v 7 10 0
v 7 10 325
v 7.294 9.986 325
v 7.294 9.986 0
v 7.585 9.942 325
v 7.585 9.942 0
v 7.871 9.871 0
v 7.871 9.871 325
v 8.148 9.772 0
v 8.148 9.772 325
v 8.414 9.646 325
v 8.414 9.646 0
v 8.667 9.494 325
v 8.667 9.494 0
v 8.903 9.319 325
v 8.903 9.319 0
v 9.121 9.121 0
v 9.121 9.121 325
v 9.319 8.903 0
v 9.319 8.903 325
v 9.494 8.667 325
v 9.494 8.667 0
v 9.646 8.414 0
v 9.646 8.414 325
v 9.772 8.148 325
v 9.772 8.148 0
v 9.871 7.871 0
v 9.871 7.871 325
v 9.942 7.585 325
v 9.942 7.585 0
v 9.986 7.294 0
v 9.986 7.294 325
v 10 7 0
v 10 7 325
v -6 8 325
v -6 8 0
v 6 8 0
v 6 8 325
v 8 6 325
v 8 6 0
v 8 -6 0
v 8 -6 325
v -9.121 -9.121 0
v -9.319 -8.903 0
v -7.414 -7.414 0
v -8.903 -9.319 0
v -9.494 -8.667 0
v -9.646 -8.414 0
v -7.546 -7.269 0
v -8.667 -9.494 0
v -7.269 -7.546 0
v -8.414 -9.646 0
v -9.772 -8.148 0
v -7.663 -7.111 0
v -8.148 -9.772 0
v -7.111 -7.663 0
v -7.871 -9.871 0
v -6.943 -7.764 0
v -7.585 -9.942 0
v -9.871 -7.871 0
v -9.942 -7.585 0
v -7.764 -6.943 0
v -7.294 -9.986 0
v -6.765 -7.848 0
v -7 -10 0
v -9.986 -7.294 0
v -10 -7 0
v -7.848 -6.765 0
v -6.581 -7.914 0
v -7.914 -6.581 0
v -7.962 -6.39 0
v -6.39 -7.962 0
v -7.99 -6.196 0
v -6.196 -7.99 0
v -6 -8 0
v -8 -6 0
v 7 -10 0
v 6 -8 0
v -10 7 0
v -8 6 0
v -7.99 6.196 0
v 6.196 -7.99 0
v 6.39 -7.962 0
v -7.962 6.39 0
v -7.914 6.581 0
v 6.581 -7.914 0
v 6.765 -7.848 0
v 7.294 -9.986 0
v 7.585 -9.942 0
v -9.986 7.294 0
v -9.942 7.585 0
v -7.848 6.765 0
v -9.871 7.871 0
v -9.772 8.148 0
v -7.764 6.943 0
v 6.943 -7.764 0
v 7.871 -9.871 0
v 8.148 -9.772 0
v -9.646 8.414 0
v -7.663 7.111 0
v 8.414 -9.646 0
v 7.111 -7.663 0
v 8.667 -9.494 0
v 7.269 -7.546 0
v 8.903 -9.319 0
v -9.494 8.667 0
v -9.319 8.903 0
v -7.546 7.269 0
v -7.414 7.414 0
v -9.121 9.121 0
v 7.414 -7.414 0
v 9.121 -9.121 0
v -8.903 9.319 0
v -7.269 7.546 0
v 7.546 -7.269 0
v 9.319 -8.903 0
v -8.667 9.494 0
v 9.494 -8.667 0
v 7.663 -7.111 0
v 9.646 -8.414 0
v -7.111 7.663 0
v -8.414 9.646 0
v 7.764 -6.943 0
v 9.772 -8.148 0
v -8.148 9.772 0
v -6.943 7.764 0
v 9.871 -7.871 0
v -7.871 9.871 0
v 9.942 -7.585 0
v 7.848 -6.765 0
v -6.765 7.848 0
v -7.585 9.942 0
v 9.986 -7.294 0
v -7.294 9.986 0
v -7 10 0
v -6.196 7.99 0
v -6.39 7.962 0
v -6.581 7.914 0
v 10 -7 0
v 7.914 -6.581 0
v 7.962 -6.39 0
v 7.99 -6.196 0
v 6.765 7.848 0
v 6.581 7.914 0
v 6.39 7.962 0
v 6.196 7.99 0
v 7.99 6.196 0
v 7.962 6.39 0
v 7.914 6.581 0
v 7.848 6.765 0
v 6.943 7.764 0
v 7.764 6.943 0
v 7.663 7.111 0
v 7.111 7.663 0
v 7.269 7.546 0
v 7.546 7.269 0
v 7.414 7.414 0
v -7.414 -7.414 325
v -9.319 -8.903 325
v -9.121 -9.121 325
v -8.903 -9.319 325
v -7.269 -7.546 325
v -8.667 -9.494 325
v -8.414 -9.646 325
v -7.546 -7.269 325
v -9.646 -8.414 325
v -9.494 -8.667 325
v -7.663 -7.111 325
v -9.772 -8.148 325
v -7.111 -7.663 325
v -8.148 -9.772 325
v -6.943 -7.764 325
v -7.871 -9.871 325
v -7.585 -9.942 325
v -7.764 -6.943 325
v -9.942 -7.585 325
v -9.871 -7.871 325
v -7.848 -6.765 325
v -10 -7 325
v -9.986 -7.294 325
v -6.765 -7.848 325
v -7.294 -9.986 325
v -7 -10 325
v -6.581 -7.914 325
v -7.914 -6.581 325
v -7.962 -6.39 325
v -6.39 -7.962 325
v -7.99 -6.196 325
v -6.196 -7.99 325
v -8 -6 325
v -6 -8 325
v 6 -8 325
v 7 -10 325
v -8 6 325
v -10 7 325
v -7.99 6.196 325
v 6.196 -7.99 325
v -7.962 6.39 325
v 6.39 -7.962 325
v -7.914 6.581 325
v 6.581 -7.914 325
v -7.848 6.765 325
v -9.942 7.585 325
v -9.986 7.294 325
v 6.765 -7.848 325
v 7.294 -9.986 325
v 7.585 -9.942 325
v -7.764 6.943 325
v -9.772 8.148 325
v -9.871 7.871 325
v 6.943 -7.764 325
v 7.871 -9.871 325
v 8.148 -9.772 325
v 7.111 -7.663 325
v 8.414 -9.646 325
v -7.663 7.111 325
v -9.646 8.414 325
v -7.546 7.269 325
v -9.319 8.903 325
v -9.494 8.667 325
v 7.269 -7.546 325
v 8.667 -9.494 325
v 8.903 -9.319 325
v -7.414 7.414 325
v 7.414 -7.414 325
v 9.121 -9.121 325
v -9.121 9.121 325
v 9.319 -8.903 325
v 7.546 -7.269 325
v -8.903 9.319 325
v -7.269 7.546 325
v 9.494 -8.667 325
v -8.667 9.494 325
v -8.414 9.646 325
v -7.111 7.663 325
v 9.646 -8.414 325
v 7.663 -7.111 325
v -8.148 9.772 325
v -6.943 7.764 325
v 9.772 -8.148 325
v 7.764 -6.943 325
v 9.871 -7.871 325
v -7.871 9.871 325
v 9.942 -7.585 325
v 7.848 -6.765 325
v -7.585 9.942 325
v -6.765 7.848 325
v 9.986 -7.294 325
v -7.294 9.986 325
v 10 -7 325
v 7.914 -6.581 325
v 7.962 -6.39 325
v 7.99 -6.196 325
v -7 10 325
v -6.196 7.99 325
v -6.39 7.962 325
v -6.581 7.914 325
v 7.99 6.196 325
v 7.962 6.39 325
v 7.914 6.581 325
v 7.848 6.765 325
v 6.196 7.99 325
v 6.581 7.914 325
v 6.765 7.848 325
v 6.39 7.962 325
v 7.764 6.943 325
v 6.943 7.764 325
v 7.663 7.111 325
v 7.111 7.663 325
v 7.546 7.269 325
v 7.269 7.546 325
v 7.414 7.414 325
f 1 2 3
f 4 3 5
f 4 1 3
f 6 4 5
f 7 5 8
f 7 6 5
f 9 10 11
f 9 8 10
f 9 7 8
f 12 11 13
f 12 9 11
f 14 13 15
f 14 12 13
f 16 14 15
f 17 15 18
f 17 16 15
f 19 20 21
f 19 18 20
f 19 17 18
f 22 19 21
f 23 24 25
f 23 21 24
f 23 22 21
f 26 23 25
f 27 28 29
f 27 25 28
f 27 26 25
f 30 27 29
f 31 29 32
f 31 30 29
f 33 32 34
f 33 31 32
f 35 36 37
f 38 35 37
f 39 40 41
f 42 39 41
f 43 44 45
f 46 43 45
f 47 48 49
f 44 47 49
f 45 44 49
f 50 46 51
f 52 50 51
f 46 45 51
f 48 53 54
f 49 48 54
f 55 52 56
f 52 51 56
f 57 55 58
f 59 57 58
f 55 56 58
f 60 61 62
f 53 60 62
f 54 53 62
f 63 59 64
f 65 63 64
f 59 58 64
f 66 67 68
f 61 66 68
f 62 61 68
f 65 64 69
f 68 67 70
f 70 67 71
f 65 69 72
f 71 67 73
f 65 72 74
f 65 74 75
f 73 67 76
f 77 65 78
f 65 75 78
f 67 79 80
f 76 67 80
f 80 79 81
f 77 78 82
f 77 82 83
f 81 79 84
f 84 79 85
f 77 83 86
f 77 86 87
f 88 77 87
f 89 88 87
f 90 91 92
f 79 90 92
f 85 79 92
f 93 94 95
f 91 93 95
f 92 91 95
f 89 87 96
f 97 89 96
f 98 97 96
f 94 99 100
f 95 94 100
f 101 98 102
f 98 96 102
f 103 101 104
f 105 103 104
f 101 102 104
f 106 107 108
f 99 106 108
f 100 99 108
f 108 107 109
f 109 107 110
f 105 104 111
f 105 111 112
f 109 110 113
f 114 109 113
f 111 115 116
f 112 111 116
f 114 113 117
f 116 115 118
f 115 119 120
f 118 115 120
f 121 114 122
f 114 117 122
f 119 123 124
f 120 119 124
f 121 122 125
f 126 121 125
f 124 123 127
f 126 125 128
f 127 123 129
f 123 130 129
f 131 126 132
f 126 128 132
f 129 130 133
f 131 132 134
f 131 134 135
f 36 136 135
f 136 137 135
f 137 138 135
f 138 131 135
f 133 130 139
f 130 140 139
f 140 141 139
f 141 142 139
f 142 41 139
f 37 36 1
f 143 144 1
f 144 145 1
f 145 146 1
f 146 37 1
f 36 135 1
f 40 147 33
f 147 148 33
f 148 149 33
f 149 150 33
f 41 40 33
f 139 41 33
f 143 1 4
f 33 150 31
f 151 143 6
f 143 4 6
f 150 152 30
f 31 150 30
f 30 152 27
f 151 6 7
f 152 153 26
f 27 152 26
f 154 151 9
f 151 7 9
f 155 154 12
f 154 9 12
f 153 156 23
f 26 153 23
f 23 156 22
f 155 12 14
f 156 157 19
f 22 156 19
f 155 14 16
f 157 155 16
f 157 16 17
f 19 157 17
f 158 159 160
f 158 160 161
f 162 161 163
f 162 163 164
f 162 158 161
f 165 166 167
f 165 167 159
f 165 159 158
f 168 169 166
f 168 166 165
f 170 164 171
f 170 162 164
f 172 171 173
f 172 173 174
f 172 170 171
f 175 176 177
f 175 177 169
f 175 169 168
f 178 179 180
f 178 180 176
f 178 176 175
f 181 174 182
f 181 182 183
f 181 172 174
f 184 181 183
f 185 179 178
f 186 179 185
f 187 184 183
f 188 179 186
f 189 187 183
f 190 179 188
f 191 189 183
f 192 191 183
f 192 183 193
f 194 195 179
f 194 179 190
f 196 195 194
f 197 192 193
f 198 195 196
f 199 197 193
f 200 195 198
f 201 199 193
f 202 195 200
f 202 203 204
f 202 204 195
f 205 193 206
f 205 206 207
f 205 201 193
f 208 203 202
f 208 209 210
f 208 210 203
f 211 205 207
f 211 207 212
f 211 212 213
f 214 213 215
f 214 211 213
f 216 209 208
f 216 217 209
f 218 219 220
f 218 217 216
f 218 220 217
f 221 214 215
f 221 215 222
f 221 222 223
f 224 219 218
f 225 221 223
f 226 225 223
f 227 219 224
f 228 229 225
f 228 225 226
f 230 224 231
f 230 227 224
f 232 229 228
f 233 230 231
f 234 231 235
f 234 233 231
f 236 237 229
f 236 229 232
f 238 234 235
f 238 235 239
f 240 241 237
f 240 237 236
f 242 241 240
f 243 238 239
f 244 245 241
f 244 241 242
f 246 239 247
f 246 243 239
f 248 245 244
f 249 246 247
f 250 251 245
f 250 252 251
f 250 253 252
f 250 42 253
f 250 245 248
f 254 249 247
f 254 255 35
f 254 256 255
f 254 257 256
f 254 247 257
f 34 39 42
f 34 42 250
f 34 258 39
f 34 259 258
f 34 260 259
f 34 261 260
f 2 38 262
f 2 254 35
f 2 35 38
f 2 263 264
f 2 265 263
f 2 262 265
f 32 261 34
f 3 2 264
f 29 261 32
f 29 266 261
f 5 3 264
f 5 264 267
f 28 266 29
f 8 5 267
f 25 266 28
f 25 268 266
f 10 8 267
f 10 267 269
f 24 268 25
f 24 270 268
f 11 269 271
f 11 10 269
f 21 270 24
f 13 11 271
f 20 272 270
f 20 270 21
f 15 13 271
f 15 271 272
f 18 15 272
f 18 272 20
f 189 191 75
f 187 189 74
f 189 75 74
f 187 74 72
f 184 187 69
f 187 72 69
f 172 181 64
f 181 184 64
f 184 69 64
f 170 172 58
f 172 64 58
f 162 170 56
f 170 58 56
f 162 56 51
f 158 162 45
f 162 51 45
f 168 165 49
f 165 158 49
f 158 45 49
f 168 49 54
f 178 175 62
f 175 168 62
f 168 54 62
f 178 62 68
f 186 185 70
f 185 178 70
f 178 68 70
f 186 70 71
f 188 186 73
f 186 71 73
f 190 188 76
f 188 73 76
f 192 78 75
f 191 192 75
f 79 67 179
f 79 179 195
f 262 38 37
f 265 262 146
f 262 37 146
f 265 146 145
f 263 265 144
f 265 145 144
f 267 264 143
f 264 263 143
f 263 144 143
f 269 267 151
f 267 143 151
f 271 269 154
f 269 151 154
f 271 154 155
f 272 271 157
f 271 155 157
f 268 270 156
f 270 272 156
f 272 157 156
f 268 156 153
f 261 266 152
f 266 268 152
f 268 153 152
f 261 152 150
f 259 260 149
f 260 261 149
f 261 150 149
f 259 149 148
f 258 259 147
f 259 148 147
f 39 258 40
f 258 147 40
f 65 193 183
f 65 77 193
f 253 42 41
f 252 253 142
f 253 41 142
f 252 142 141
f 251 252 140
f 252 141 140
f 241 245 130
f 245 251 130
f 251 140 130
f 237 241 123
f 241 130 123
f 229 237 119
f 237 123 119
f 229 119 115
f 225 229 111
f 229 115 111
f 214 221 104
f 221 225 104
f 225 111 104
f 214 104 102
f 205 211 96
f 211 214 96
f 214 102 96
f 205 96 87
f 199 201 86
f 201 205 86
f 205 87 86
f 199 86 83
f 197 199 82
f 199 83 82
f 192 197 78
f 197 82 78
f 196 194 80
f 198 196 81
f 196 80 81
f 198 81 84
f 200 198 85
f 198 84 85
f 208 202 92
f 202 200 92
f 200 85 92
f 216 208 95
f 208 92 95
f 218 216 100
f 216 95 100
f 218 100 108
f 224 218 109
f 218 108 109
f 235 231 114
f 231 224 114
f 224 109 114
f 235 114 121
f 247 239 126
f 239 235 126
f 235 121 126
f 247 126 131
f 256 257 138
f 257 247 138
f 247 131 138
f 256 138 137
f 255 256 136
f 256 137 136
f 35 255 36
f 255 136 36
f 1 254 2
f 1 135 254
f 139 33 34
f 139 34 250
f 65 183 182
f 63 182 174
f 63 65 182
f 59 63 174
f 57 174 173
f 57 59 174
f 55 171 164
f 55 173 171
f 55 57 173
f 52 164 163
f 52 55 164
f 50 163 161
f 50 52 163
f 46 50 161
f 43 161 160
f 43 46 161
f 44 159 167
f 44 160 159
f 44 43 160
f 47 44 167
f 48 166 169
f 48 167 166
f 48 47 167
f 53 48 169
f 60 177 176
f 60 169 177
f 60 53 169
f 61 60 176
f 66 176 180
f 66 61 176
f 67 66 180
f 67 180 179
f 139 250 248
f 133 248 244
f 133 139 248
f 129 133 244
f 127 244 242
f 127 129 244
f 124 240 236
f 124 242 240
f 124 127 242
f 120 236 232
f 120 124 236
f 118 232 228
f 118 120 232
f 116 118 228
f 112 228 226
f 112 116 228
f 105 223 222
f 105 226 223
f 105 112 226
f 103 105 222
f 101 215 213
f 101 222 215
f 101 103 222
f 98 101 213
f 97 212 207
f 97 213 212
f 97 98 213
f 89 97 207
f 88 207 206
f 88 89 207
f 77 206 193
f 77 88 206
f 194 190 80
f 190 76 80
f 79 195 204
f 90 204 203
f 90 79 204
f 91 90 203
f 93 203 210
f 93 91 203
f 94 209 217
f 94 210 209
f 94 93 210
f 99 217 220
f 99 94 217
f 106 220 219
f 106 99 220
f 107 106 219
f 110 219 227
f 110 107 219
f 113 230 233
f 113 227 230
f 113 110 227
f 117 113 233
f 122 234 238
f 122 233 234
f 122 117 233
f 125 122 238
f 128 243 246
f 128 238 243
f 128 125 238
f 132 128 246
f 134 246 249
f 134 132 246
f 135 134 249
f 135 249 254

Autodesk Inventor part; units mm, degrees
ref_plane "YZ Plane" through (0, 0, 0) normal (1, 0, 0) x (0, 1, 0)
ref_plane "Start Plane" through (0, 0, 0) normal (0, 0, 1) x (1, 0, 0)
ref_plane "End Plane" through (0, 0, 325) normal (0, 0, 1) x (1, 0, 0)
sketch "Sketch" plane through (0, 0, 0) normal (0, 0, 1) x (1, 0, 0)
  line L0 (-10, -7) -> (-10, 7)
  line L1 (-7, 10) -> (7, 10)
  line L2 (10, 7) -> (10, -7)
  line L3 (7, -10) -> (-7, -10)
  arc A0 (-10, -7) -> (-7, -10) centre (-7, -7) ccw
  arc A1 (-7, 10) -> (-10, 7) centre (-7, 7) ccw
  arc A2 (10, 7) -> (7, 10) centre (7, 7) ccw
  arc A3 (7, -10) -> (10, -7) centre (7, -7) ccw
  line L4 (-6, 8) -> (6, 8)
  line L5 (8, 6) -> (8, -6)
  line L6 (6, -8) -> (-6, -8)
  line L7 (-8, -6) -> (-8, 6)
  line L8 (0, 14.8698) -> (0, -14.8698) construction
  line L9 (-14.8698, 0) -> (14.8698, 0) construction
  arc A4 (-8, -6) -> (-6, -8) centre (-6, -6) ccw
  arc A5 (-6, 8) -> (-8, 6) centre (-6, 6) ccw
  arc A6 (8, 6) -> (6, 8) centre (6, 6) ccw
  arc A7 (6, -8) -> (8, -6) centre (6, -6) ccw
  dimension "d7" = 3
  dimension "d10" = 20
  dimension "d11" = 20
  dimension "d12" = 2
  dimension "d15" = 10
  dimension "d16" = 10
  dimension "d19" = 2
  dimension "d20" = 2
extrude "Body" add sketch "Sketch" along normal up to surface (325 mm away) from surface at 0
sketch "Sketch3" plane through (0, 0, 0) normal (0, 0, 1) x (1, 0, 0)
  line L0 (0, 0) -> (10, 0)
ref_plane "Work Plane3" through (0, 0, 0) normal (0, -1, 0) x (1, 0, 0)
sketch "Sketch4" plane through (0, 0, 0) normal (0, -1, 0) x (1, 0, 0)
  line L0 (-2, 0) -> (12, 0) projected
  line L1 (-2, 325) -> (12, 325) projected
  dimension "d18" = 325
equation "\"d7\" = G_IR"
equation "\"d10\" = G_H"
equation "\"d11\" = G_W"
equation "\"d12\" = G_T"
equation "\"d15\" = 0.5 * d10"
equation "\"d16\" = 0.5 * d11"
equation "\"d19\" = G_T"
equation "\"d20\" = G_T"
equation "\"d3\" = G_L"
equation "\"G_W\" = 20"
equation "\"G_H\" = 20"
equation "\"G_T\" = 2"
equation "\"G_IR\" = 3"
equation "\"G_L\" = d18"
equation "\"G_OFFSET_START\" = 0"
equation "\"G_OFFSET_END\" = 0"
equation "\"d14\" = G_OFFSET_END + B_L"
equation "\"B_L\" = 325"
properties part number "DIN EN 10210-2 - 20 x 20 x 2 - 325" material "Steel, Mild"
